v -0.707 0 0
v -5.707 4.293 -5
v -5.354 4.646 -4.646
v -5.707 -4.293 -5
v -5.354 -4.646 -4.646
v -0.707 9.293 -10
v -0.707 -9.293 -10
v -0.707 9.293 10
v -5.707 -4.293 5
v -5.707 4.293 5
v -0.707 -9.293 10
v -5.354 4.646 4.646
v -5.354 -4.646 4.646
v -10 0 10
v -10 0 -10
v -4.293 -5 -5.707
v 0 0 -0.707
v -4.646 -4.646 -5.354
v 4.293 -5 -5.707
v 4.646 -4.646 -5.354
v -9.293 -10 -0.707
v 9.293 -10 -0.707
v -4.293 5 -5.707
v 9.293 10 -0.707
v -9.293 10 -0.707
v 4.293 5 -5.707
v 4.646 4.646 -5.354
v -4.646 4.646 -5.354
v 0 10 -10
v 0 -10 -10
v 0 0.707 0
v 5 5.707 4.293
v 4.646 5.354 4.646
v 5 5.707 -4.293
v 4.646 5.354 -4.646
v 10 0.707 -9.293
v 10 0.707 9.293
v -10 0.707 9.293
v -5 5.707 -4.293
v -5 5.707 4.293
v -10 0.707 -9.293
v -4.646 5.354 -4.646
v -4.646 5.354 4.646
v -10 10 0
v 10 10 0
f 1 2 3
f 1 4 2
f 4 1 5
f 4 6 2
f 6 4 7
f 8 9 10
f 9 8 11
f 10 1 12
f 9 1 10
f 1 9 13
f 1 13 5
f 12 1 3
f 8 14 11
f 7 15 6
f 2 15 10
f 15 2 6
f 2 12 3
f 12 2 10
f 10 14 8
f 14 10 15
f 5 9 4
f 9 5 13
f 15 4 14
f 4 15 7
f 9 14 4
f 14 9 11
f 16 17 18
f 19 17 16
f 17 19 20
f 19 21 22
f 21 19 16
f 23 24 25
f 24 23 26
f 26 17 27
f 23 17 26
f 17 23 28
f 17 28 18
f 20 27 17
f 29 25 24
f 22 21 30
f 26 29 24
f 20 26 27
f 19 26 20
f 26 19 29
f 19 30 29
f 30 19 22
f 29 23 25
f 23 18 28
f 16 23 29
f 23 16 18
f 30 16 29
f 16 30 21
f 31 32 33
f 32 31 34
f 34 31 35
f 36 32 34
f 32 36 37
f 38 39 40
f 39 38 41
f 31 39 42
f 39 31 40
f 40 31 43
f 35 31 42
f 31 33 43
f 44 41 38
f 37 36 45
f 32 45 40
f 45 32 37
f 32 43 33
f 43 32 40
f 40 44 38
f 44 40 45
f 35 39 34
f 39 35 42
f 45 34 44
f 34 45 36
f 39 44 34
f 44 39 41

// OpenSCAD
l=20;
cote=l;
diag=l*sqrt(2)/2;
dia2=l*sqrt(2)/4;
eps=0.5;


module piece() {
    rotate([0,0,-45])
      translate([-dia2-eps,-dia2-eps,-cote/2])
         difference(){
                translate([eps,eps,0])
                cube([diag,diag,cote]);
                translate([diag,0,-diag])
                rotate( [0,0,45])cube([cote,cote,2*cote]);
           

                union() {
                       translate([dia2,dia2,cote/4])
                       rotate([0,45,45])
                       cube([dia2,cote,dia2],center=true) ;

                       translate([dia2,dia2,3*cote/4])
                       rotate([0,45,45])
                       cube([dia2,cote,dia2],center=true) ;
                        };
                union() {
                       translate([dia2,0,cote/4])
                       cube([cote/2,cote,cote/2]);

                       translate([0,dia2,cote/4])
                       cube([cote,cote/2,cote/2]);
                        };
                      } ;;
     
                }
 piece();
 //rotate([0,180,0])piece();  
    rotate([0,-90,-90])piece();              
   // rotate([0,90,90])piece(); 
         rotate([90,0,-90])piece();                  
       // rotate([90,0,+90])piece();               
       
